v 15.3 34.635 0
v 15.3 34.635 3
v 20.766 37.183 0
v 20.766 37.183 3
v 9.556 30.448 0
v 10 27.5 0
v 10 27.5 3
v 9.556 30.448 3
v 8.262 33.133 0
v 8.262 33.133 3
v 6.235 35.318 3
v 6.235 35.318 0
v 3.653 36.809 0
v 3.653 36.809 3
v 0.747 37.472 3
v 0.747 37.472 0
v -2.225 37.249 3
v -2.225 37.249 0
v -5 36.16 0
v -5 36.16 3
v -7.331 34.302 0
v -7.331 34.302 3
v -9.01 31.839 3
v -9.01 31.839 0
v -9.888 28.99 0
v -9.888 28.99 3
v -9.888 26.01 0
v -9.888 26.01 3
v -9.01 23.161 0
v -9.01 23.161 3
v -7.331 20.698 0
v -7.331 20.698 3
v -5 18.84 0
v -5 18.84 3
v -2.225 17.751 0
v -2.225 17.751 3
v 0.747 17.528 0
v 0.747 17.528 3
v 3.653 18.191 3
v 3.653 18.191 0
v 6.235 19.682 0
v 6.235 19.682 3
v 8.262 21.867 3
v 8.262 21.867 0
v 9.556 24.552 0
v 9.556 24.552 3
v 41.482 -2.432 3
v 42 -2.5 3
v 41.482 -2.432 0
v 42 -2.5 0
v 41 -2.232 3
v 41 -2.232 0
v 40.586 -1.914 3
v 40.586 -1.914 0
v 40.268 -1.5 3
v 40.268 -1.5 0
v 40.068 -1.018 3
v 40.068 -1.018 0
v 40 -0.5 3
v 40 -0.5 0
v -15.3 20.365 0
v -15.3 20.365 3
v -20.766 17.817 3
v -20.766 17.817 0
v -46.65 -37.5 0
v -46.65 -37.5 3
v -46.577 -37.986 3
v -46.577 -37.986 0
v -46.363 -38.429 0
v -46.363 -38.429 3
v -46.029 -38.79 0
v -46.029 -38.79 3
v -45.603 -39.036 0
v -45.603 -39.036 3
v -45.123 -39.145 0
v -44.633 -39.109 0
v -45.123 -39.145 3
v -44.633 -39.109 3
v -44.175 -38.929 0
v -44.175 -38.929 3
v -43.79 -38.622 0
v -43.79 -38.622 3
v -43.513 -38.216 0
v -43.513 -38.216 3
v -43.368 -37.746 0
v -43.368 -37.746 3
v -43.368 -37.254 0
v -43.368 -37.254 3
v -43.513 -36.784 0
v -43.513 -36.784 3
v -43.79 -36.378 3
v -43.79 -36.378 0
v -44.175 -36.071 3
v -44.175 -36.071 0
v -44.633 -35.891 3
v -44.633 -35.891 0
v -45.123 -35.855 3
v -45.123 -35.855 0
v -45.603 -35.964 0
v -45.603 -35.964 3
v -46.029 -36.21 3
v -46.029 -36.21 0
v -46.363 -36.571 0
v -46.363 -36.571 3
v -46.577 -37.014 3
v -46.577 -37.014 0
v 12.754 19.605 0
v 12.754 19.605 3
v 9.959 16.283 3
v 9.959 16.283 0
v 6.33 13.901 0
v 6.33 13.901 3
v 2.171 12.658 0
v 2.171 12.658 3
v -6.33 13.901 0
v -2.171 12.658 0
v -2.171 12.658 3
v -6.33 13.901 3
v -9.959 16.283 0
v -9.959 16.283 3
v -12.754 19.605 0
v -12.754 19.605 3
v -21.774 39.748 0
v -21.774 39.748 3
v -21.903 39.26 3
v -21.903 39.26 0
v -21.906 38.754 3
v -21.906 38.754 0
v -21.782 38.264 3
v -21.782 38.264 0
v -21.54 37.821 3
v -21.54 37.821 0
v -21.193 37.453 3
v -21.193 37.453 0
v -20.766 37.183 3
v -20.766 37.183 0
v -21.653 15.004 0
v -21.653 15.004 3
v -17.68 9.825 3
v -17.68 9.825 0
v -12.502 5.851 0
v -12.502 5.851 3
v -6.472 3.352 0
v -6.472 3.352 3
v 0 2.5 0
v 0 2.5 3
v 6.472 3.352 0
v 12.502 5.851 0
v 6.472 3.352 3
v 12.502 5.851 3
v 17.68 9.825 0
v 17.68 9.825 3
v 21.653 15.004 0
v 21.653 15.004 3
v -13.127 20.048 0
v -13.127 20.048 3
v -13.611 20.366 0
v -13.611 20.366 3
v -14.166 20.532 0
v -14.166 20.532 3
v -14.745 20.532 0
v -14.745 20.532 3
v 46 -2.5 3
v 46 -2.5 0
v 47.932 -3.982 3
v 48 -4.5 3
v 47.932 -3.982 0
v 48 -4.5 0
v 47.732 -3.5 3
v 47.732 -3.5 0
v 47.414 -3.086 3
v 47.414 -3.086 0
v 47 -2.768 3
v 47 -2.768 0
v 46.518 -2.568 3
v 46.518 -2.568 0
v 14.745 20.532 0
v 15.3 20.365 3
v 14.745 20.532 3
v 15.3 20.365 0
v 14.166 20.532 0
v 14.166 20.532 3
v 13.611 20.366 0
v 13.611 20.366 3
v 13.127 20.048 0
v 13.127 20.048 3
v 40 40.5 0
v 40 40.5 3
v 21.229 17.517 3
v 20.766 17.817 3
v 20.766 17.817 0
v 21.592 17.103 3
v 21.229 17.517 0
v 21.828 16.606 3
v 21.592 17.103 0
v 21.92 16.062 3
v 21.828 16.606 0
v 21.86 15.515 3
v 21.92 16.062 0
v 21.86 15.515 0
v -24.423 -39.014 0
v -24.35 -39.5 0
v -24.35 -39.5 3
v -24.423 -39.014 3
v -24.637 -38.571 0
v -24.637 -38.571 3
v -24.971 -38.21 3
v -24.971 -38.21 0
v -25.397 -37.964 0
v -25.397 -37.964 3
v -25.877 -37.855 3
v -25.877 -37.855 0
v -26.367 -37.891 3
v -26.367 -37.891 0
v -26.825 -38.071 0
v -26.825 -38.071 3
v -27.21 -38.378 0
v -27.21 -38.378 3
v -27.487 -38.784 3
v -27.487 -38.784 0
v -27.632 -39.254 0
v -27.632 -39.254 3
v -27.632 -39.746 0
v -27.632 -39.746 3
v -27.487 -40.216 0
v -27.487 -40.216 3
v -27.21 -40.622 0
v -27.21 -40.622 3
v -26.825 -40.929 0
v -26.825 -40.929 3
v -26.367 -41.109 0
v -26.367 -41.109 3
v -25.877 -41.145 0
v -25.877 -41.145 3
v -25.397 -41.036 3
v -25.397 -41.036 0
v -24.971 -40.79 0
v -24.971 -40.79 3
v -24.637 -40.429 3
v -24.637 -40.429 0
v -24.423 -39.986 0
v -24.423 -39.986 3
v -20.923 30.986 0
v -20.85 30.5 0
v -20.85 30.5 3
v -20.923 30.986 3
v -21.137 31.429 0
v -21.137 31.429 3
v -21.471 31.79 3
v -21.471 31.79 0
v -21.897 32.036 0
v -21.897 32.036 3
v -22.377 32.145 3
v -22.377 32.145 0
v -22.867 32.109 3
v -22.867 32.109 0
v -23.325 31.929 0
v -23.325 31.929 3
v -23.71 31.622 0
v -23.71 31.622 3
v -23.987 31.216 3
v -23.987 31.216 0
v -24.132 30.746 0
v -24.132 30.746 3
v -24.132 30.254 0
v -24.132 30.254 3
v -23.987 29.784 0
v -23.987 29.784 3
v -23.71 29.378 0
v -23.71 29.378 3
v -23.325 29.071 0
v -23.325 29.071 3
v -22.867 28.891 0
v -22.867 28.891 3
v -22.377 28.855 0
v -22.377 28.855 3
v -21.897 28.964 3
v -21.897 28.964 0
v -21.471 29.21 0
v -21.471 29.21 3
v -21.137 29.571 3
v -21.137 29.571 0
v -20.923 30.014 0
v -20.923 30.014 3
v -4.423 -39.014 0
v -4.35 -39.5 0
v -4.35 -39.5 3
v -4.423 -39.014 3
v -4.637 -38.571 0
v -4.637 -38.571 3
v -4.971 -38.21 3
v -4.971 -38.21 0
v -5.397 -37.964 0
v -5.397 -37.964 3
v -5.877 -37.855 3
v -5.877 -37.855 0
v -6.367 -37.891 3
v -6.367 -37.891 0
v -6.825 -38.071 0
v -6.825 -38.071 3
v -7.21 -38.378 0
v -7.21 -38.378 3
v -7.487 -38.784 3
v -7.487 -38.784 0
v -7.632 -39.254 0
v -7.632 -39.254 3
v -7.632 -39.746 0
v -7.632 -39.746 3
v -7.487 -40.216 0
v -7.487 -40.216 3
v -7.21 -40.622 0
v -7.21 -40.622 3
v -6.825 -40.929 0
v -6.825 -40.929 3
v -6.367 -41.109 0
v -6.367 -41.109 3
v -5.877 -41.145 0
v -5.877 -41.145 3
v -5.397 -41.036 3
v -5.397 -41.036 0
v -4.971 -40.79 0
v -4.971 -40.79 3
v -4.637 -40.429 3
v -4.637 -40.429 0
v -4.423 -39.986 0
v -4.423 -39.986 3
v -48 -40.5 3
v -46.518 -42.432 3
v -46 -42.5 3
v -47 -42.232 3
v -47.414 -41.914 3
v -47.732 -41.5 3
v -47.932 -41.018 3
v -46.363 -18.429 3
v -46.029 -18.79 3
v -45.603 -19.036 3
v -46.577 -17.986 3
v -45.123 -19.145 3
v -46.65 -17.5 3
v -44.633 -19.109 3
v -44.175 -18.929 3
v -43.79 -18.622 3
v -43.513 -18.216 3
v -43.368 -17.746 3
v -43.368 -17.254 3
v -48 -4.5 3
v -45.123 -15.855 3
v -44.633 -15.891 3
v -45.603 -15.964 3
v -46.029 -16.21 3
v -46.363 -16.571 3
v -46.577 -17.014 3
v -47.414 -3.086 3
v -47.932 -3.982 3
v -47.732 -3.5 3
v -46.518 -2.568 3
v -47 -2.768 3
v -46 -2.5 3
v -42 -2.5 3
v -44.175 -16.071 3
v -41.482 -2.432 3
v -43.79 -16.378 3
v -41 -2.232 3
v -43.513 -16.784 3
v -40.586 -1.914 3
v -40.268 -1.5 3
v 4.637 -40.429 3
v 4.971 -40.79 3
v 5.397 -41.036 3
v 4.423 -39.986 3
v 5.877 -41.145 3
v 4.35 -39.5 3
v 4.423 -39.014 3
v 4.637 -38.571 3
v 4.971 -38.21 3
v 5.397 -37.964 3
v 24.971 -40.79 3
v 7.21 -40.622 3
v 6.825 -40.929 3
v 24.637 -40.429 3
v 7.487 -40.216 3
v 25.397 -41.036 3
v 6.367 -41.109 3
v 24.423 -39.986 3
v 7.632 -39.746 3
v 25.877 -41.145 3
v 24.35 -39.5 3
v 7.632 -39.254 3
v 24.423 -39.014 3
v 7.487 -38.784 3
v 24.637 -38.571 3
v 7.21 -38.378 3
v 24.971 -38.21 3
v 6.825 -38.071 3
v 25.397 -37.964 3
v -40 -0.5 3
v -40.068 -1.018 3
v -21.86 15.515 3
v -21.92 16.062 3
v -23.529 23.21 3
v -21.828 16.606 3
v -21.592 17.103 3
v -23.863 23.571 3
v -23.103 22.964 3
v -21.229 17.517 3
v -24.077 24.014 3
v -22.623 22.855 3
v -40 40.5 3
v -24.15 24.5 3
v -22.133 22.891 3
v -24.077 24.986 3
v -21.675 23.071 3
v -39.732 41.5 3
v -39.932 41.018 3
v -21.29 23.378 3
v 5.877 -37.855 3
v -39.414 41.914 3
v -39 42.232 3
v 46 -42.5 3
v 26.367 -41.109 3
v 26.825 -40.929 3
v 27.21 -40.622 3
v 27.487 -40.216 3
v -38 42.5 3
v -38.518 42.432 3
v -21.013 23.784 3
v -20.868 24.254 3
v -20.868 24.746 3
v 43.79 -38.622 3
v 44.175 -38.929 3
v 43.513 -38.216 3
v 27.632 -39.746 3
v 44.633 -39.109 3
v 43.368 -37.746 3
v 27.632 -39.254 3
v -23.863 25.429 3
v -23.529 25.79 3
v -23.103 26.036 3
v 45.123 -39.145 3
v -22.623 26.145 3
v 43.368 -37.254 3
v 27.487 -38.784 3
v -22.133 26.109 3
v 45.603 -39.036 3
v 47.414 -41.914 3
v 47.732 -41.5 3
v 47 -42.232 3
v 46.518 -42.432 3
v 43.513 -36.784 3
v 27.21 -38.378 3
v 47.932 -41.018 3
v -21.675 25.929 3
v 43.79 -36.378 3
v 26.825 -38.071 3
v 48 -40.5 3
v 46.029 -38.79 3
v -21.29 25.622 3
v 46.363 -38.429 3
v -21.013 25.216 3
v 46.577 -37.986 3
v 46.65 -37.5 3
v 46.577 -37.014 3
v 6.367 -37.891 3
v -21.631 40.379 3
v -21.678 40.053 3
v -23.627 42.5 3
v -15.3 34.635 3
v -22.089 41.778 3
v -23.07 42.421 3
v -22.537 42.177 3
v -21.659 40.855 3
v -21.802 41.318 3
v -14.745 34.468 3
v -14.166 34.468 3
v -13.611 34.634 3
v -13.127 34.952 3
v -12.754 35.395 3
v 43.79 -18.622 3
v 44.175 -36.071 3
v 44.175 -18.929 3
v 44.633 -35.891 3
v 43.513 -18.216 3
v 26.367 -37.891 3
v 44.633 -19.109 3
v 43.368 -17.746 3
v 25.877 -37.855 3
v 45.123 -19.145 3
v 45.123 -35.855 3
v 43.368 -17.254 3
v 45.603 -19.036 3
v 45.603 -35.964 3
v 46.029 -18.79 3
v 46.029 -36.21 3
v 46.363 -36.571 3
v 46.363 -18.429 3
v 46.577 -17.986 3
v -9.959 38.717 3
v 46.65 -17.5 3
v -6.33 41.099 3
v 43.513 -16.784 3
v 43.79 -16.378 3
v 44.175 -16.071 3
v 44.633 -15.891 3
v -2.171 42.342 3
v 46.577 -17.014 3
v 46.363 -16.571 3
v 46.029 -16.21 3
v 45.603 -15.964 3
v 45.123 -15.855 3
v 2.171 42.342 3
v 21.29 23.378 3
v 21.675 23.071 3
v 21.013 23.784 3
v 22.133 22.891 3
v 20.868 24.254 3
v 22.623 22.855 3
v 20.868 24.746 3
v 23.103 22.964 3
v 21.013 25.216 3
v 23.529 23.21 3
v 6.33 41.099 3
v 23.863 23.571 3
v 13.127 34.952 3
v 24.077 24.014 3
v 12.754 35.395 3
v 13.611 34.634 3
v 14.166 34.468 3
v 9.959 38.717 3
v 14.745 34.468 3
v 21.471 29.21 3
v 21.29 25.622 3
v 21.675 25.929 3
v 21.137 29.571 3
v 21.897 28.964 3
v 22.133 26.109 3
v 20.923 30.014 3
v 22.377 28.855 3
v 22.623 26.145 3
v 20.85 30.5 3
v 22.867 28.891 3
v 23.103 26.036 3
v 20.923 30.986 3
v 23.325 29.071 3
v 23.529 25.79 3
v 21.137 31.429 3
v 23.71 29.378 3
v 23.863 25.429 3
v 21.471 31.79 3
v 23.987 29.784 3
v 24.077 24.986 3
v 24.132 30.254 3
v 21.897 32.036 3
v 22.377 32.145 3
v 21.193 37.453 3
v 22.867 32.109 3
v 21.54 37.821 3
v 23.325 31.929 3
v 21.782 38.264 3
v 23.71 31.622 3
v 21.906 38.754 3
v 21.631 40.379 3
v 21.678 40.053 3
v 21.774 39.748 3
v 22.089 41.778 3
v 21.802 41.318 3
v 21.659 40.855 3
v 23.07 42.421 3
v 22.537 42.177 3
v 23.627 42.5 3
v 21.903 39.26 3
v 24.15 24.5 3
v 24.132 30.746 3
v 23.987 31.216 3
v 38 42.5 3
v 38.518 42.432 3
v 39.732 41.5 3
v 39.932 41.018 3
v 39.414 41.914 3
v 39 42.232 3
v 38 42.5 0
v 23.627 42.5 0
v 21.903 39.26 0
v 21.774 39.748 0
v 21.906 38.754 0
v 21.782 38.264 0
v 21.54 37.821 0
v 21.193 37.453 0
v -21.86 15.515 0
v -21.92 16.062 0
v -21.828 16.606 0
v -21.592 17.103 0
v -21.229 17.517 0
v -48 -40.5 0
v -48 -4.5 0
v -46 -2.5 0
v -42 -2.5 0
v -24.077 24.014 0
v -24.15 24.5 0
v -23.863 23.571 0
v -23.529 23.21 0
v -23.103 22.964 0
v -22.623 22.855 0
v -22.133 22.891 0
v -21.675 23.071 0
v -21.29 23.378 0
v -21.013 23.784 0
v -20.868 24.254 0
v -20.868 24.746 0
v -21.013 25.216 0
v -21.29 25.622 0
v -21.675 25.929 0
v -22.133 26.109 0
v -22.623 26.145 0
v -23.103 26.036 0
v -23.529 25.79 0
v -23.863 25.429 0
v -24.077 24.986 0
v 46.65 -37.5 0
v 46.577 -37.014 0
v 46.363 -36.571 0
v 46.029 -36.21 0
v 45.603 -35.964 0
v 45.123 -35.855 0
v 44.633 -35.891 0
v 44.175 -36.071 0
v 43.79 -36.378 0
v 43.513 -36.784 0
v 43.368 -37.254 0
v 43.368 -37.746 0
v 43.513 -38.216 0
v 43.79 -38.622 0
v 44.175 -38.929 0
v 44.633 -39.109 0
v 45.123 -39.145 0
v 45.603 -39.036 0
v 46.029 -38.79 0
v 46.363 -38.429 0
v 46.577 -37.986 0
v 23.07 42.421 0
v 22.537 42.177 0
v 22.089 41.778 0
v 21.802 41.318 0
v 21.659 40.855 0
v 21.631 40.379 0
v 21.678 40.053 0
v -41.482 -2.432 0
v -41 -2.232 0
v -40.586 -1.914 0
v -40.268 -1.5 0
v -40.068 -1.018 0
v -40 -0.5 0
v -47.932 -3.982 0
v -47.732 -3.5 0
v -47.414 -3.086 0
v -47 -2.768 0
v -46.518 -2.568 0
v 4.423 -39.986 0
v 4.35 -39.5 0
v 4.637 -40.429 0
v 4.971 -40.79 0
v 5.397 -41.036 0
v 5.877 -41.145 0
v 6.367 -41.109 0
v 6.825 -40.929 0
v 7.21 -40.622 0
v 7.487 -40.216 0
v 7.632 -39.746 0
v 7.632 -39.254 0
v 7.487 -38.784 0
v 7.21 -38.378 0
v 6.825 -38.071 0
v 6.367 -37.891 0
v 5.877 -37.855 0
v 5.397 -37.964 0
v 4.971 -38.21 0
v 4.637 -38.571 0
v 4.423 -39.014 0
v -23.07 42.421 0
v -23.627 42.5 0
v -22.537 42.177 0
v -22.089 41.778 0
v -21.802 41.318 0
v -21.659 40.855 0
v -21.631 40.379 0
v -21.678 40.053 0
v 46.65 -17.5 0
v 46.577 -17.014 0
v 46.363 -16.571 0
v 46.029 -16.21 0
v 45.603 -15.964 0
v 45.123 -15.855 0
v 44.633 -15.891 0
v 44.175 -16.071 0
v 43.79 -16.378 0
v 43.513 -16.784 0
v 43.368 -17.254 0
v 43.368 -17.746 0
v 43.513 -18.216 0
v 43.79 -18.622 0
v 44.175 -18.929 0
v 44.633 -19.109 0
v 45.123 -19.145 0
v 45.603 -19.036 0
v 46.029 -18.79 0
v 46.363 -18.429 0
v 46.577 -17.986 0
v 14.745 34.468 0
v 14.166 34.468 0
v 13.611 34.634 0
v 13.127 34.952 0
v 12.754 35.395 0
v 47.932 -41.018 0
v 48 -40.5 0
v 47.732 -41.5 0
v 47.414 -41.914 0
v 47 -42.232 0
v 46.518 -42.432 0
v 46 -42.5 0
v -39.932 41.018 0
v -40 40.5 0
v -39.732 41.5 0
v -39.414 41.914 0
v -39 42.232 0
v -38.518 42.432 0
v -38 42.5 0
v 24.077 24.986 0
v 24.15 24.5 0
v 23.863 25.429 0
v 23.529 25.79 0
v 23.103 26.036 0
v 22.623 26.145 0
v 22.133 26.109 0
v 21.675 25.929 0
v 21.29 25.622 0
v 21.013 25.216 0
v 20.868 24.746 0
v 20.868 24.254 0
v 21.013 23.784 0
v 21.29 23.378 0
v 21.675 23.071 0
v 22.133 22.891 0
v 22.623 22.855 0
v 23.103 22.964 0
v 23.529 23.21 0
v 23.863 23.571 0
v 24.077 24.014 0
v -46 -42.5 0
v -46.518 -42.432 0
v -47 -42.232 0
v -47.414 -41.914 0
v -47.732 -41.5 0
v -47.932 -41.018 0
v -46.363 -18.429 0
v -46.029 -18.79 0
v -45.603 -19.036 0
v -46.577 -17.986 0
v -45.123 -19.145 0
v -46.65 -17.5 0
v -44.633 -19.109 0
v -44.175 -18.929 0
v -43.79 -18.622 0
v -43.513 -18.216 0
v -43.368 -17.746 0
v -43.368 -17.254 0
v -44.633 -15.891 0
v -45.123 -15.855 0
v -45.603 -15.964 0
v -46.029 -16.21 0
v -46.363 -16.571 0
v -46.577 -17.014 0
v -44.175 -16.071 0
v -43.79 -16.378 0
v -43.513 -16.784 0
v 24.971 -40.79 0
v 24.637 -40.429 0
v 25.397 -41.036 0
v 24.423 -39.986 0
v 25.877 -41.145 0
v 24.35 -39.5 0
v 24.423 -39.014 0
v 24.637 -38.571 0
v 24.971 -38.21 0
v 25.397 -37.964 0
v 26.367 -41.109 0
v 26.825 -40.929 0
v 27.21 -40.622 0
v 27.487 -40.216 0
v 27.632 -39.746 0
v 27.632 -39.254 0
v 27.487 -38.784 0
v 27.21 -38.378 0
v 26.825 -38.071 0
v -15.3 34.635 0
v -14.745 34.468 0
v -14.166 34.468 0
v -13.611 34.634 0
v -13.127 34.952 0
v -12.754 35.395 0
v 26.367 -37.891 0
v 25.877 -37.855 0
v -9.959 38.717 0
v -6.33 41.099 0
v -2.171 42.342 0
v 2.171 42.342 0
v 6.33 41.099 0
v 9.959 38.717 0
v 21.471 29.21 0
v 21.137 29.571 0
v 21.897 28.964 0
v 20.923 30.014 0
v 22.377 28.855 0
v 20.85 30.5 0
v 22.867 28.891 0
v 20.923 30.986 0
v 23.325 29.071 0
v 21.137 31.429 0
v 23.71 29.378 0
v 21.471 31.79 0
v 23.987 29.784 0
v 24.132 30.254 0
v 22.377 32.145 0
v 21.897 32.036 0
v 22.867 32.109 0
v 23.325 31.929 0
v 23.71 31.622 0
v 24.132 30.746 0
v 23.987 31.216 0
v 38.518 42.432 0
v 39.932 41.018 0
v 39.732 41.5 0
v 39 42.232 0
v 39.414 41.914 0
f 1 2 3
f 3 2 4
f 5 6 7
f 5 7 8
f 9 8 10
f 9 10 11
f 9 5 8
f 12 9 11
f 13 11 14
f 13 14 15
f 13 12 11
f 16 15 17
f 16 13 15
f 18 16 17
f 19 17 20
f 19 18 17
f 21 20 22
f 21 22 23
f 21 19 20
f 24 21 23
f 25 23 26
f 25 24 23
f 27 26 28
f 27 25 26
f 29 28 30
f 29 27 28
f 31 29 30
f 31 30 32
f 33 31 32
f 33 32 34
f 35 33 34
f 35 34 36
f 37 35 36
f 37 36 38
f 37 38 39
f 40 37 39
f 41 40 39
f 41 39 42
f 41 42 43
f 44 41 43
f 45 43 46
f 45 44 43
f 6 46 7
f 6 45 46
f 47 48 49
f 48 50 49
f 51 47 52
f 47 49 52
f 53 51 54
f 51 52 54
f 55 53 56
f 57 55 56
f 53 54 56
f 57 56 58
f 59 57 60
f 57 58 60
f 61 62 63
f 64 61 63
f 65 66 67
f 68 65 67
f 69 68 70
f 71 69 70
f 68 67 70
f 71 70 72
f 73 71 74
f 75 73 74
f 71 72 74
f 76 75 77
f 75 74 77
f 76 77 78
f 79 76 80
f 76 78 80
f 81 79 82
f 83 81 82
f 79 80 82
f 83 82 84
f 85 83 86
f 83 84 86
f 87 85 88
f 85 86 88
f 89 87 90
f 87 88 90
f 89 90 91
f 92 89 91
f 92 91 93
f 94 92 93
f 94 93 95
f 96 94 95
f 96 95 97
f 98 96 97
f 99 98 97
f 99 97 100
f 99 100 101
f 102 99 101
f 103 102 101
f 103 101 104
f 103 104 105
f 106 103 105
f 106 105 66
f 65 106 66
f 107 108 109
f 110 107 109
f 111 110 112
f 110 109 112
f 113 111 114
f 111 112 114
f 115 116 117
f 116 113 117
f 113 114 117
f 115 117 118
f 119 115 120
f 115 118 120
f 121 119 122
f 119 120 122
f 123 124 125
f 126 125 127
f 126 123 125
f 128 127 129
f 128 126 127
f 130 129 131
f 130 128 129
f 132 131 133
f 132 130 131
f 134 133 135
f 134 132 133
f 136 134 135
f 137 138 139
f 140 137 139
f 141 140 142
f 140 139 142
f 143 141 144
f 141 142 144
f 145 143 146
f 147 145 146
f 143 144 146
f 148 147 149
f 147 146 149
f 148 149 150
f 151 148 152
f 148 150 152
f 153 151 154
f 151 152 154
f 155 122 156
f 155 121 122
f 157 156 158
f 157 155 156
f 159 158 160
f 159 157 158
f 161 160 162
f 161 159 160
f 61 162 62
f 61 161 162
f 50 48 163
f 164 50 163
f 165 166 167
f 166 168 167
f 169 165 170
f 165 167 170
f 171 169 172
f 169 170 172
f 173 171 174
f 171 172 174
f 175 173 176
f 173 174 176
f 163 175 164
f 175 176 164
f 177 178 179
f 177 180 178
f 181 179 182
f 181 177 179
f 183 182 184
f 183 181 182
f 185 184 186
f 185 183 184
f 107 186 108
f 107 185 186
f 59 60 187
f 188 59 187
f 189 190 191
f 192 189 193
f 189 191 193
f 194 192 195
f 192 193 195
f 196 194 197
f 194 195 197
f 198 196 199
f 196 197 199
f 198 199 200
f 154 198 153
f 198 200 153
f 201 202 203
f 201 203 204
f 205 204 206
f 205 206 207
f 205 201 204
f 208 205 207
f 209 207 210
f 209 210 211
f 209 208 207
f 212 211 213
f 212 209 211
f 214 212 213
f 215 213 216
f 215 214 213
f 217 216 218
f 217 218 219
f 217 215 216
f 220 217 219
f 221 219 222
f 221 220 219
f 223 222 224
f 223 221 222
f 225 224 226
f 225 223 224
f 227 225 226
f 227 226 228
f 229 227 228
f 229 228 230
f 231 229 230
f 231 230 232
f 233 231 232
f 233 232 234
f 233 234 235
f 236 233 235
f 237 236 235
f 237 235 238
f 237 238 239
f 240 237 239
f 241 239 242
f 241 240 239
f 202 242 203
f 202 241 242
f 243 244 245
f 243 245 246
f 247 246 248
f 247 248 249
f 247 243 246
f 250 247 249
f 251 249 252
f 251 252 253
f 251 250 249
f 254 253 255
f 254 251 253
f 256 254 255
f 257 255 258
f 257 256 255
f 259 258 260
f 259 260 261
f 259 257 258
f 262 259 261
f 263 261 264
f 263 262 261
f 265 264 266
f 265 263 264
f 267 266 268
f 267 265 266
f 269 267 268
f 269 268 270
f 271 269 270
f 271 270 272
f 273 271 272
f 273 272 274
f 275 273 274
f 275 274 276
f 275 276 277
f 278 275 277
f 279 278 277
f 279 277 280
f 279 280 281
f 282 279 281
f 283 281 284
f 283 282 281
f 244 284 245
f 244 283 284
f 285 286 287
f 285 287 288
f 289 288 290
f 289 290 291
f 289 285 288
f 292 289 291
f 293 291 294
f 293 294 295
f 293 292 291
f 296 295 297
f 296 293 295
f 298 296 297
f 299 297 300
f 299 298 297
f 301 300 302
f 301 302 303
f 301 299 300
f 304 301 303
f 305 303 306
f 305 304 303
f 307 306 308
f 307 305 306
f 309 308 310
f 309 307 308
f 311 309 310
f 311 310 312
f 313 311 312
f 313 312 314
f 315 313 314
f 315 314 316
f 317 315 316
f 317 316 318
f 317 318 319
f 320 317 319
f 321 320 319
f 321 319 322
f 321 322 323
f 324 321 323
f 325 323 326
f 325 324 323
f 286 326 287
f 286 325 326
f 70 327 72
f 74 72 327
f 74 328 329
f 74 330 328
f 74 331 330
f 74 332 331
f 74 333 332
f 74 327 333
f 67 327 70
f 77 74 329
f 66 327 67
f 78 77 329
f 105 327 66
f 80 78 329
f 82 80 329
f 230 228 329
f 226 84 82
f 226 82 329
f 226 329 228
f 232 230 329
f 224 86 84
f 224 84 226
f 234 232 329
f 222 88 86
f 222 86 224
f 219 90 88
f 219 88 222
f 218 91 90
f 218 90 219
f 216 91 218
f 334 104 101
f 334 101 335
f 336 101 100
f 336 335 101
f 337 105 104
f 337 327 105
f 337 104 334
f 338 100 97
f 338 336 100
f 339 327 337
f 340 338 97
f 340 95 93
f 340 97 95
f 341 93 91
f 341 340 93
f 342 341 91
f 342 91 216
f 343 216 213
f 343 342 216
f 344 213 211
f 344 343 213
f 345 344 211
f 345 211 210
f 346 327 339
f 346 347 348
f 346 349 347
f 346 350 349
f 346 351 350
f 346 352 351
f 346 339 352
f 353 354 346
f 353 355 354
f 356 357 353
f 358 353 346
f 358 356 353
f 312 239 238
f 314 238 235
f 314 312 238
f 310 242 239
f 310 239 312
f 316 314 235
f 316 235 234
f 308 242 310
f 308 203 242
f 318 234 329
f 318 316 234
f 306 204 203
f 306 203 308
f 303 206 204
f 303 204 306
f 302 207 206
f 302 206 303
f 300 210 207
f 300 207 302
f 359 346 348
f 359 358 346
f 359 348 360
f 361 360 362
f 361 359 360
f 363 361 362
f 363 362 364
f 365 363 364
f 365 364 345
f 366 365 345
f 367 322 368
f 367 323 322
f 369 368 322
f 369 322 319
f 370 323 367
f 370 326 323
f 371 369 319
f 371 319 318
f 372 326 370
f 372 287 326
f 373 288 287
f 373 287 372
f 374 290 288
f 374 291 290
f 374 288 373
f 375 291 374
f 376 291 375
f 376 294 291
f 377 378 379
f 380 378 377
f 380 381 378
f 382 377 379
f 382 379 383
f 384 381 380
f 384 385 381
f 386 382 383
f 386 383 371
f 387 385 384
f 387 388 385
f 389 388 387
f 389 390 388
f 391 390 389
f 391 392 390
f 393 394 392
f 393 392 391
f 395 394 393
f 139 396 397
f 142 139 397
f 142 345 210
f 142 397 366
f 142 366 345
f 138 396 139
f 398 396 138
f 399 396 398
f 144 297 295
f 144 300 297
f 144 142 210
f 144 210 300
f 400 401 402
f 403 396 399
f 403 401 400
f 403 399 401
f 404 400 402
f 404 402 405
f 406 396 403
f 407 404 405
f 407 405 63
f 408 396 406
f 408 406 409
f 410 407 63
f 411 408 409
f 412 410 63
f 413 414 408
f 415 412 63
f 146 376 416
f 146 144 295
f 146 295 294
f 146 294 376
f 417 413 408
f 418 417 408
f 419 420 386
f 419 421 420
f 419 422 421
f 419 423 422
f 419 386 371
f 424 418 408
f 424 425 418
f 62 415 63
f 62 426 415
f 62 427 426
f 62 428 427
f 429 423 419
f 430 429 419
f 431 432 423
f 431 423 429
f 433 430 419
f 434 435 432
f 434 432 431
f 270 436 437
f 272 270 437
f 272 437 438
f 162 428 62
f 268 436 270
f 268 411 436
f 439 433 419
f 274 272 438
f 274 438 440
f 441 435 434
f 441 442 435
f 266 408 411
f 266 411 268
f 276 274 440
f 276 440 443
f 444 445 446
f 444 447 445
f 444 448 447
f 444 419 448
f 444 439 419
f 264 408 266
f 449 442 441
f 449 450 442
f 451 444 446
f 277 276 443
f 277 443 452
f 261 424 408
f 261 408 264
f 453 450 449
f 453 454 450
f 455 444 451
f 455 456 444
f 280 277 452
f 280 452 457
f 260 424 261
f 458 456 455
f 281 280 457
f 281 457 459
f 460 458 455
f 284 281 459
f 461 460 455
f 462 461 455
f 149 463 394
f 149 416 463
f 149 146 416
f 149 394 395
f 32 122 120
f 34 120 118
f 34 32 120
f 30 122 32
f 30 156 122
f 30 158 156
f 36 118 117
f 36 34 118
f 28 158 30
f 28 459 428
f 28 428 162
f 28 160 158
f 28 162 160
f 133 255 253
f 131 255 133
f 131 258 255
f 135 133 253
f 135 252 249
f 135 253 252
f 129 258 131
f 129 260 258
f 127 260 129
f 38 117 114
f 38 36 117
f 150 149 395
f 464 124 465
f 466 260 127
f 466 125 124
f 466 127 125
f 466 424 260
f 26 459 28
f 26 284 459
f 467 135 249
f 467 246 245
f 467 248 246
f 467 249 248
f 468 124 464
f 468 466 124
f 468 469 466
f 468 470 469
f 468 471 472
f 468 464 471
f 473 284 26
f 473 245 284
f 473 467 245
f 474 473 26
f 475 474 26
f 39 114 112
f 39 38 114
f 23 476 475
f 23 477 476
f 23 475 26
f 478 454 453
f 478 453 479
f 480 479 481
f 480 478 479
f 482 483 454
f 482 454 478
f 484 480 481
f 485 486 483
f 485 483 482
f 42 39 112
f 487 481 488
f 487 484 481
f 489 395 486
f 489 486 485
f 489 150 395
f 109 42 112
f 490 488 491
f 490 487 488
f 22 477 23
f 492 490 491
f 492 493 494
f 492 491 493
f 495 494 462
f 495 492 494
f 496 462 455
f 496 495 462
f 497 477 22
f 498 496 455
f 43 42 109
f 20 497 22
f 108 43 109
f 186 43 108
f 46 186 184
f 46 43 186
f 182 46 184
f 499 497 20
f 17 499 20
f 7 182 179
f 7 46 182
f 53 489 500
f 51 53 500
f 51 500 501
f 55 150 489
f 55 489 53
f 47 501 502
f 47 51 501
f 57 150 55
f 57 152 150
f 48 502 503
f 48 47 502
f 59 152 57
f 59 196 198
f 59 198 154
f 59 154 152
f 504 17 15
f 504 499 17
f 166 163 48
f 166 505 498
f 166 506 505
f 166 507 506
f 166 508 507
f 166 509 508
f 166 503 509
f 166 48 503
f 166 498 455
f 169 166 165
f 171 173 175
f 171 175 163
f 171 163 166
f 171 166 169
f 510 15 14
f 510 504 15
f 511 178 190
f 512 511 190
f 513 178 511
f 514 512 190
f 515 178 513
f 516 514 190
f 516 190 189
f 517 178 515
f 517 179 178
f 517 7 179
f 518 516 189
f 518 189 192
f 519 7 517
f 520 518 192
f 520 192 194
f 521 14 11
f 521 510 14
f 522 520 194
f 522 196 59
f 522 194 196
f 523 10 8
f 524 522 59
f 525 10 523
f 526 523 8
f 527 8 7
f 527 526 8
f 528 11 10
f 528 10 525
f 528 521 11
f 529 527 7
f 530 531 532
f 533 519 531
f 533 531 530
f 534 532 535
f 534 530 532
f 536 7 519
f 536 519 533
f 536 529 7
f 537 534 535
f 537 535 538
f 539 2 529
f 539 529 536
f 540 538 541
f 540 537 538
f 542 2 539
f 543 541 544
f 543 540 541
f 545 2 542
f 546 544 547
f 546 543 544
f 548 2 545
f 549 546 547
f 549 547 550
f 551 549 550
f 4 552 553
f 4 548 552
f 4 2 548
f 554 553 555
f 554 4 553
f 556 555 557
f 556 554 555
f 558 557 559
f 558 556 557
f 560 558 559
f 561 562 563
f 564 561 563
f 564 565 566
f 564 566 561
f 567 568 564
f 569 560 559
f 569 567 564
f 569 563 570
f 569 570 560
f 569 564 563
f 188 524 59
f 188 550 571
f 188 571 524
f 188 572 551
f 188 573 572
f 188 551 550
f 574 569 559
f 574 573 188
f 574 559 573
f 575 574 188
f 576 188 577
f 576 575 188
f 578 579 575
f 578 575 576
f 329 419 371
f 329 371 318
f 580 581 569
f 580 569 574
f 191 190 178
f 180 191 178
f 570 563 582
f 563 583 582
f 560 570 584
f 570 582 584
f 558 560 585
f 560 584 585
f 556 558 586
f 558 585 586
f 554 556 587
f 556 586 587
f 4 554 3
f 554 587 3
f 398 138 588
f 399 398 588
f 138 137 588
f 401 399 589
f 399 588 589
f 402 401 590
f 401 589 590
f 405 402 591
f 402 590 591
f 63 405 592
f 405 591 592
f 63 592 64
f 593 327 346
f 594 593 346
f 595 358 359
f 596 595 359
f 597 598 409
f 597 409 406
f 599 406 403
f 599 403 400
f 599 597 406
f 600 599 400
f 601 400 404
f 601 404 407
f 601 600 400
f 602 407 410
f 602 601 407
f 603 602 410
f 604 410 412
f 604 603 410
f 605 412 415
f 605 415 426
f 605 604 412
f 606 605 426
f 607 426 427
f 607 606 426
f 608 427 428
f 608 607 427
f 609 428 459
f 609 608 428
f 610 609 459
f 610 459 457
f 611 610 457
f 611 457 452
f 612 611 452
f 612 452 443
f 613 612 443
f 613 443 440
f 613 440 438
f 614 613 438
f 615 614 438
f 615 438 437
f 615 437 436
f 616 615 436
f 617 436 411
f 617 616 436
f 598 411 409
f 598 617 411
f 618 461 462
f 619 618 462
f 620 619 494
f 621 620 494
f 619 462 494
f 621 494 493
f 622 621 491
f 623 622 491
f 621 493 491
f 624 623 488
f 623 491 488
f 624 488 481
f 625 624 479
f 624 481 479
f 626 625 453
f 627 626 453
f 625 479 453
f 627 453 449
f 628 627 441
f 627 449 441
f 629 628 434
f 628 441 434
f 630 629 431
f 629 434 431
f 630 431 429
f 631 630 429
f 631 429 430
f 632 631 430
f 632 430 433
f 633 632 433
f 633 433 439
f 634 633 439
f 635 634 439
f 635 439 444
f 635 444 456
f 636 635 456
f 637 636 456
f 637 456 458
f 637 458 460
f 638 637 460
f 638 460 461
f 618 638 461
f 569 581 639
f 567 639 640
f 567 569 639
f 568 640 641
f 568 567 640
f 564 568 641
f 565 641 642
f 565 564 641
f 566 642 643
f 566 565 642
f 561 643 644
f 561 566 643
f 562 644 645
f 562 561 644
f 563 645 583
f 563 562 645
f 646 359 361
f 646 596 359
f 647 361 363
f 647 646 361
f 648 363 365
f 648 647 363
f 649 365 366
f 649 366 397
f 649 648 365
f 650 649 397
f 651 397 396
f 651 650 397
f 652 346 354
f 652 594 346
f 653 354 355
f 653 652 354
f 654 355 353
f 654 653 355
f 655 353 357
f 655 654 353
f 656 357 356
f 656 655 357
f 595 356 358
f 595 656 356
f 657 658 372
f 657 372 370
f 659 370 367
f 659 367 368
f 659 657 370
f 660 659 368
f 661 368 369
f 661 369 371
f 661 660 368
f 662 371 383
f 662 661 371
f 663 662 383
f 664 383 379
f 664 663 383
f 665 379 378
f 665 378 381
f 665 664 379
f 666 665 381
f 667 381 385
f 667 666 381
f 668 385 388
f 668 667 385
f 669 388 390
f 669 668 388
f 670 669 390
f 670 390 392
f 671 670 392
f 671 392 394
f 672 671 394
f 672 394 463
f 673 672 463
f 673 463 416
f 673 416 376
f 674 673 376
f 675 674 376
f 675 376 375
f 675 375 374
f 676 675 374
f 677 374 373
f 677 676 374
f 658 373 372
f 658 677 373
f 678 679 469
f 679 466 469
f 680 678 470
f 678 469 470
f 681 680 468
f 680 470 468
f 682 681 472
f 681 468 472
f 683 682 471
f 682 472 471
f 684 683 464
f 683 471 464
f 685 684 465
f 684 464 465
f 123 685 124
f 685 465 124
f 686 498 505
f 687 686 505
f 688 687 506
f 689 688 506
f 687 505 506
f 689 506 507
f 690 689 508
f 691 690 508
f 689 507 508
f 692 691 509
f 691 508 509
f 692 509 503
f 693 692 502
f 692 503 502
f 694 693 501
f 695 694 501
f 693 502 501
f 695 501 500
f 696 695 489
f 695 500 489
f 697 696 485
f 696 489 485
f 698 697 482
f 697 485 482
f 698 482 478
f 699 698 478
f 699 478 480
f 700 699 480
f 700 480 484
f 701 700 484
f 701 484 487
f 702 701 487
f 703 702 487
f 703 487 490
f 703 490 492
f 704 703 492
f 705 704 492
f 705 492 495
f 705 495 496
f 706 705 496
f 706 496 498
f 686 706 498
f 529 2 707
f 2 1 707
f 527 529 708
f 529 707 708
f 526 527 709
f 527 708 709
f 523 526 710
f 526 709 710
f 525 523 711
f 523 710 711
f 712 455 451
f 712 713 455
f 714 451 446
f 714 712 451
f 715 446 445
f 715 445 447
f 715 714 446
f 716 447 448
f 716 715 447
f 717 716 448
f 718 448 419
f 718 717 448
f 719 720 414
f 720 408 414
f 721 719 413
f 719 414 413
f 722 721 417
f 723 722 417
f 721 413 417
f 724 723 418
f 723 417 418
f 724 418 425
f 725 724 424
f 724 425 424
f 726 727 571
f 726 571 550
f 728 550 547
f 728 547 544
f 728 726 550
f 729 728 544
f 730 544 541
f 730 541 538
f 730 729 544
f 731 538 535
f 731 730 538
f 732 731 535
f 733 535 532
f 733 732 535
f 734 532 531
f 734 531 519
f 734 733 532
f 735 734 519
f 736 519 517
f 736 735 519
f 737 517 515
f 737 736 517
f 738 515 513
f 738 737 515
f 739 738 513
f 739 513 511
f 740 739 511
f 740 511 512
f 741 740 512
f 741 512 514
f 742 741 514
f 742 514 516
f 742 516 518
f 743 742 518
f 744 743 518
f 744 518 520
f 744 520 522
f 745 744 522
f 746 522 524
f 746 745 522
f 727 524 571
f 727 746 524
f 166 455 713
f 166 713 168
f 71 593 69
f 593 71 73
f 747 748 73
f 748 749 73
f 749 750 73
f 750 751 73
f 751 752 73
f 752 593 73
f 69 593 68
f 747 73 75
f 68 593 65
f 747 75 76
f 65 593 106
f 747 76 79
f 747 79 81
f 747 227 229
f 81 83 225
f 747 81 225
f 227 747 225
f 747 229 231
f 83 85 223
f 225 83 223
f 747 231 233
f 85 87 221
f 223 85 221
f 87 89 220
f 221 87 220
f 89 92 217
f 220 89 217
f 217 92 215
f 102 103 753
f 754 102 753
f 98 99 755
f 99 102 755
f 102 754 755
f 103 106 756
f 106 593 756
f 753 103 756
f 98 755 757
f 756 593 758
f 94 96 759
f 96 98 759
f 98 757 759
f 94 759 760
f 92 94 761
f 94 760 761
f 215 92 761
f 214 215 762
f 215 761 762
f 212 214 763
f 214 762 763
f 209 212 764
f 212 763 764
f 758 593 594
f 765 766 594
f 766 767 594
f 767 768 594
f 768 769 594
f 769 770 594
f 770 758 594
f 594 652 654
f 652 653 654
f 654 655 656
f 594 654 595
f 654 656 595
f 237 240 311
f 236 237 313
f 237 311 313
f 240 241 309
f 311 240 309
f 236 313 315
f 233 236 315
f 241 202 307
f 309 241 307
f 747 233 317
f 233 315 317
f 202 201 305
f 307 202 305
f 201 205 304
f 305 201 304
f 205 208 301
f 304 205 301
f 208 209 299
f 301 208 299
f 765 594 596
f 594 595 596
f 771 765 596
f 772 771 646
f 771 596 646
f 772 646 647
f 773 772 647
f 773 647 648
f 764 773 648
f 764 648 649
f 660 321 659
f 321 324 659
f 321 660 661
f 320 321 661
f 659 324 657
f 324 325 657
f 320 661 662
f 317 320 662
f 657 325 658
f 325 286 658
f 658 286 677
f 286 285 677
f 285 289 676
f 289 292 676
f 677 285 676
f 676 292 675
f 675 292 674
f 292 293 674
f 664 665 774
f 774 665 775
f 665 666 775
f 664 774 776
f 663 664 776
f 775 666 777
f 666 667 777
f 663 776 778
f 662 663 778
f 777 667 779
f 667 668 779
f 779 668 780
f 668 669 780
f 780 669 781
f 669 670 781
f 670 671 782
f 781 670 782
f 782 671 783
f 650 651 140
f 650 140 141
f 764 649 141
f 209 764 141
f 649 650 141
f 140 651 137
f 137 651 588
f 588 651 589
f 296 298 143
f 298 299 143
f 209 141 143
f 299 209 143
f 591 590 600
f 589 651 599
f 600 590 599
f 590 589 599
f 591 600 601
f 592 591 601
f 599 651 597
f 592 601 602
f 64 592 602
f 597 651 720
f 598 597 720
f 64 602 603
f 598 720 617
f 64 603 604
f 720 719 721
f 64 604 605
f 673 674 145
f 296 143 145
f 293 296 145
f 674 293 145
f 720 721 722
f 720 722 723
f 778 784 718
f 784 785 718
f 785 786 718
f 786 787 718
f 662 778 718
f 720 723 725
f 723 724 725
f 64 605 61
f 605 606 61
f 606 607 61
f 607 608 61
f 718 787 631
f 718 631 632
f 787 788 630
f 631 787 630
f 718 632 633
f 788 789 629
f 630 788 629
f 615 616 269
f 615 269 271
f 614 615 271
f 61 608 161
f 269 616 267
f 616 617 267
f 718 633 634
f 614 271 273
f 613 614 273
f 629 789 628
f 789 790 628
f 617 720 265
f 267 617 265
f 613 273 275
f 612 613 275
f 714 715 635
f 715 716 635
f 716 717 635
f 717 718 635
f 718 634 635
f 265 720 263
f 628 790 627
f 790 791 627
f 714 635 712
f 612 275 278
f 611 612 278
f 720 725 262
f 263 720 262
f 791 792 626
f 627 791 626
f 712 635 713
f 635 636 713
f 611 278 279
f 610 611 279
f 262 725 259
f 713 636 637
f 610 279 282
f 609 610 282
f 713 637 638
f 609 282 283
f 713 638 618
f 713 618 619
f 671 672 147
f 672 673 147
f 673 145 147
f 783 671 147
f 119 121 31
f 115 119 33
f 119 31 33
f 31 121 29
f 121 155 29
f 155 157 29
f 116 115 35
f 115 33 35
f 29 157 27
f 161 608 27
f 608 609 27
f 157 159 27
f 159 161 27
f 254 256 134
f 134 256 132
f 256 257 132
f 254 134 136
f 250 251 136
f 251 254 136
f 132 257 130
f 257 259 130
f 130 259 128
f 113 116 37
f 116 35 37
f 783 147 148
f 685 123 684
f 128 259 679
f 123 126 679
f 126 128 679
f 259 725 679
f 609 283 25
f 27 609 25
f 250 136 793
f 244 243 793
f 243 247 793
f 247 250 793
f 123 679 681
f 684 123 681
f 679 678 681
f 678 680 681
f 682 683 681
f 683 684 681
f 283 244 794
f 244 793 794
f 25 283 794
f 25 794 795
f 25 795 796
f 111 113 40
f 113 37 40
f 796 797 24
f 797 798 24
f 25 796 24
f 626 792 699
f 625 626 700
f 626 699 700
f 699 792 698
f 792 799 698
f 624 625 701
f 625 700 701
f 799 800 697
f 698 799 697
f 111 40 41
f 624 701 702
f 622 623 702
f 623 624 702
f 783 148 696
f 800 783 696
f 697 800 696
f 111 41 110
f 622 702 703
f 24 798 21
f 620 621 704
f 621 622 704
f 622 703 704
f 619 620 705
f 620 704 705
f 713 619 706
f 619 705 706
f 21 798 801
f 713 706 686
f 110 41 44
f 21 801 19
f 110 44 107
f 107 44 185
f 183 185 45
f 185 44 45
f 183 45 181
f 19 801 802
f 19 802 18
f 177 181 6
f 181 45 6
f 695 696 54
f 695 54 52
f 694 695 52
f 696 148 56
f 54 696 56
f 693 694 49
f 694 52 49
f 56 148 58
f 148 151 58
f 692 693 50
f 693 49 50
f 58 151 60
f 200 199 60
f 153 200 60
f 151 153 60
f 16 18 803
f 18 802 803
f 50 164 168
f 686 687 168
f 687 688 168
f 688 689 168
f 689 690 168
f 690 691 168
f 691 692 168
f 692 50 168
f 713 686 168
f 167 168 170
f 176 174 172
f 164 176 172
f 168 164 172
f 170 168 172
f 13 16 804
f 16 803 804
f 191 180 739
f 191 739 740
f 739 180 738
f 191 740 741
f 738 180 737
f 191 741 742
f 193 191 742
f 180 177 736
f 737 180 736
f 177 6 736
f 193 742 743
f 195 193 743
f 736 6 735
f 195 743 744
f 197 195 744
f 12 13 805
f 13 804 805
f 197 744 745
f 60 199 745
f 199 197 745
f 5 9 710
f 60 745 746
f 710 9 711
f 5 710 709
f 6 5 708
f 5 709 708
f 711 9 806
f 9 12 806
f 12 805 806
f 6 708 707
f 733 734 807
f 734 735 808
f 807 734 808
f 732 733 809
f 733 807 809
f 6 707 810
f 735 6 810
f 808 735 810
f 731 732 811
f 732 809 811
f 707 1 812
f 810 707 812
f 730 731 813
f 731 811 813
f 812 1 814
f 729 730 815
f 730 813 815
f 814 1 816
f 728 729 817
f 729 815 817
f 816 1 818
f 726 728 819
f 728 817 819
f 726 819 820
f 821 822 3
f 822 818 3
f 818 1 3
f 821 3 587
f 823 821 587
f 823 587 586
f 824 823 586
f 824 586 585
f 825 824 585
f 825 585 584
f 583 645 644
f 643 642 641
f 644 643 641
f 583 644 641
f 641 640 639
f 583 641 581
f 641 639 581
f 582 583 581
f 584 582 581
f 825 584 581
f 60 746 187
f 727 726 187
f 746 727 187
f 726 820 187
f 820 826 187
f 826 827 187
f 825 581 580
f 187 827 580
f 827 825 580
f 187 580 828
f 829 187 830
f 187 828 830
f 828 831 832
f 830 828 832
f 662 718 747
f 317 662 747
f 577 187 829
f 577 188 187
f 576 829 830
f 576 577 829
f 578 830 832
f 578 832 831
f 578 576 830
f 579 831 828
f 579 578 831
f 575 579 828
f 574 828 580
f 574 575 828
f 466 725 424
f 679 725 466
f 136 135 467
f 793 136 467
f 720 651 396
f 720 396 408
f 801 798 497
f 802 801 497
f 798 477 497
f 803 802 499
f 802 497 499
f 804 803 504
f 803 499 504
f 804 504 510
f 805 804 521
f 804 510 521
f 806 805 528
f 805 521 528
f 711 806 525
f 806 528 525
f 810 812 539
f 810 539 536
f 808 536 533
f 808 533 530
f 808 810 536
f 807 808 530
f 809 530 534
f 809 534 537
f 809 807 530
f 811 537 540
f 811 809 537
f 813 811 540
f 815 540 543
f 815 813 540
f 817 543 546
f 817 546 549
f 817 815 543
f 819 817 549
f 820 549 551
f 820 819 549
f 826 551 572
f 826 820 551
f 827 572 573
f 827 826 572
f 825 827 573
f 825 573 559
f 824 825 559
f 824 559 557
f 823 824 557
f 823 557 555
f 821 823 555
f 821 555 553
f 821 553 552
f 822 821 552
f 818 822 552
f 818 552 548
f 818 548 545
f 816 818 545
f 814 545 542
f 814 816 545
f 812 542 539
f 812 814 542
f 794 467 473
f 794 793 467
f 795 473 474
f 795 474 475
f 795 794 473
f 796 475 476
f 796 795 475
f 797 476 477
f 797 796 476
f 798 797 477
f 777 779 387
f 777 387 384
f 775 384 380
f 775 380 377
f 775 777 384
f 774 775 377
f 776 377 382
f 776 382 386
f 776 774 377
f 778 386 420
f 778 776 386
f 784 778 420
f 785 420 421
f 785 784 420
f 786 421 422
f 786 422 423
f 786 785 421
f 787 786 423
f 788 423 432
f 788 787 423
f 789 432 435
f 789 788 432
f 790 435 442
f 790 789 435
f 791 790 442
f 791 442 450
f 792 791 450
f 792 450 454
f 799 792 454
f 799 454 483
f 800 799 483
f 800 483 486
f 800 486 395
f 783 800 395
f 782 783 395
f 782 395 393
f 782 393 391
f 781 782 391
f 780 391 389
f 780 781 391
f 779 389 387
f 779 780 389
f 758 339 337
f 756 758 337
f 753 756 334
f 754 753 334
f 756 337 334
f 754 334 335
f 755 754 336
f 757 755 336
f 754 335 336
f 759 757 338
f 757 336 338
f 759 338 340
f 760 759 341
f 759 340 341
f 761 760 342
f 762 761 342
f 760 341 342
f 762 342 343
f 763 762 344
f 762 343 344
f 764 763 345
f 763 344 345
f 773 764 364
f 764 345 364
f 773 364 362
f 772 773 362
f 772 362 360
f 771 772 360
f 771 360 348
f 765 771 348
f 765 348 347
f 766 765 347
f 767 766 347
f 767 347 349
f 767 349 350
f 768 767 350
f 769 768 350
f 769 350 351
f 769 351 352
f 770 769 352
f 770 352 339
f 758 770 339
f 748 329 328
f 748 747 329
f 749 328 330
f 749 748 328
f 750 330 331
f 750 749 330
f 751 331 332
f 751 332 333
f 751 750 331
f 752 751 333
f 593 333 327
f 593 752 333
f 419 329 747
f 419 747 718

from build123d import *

# Parameters (mm, degrees)
SKETCH_1_W          = 80
SKETCH_1_H          = 85
SKETCH_1_R          = 10
SKETCH_1_R_2        = 1.65
EXTRUDE_1_DEPTH     = 3
CUT_EXTRUDE_1_DEPTH = 59.440140315
SKETCH_3_W          = 8
SKETCH_3_H          = 40
EXTRUDE_2_DEPTH     = 3
SKETCH_4_R          = 1.65
CUT_EXTRUDE_2_DEPTH = 65.181383594
FILLET_1_R          = 2
FILLET_2_R          = 2


with BuildPart() as part:
    # 草图1 → 凸台-拉伸1 (new body)
    with BuildSketch(Plane.XY):
        Rectangle(SKETCH_1_W, SKETCH_1_H)
        with Locations((0, 27.5)):
            Circle(SKETCH_1_R, mode=Mode.SUBTRACT)
        with Locations((-6, -39.5)):
            Circle(SKETCH_1_R_2, mode=Mode.SUBTRACT)
        with Locations((-26, -39.5)):
            Circle(SKETCH_1_R_2, mode=Mode.SUBTRACT)
        with Locations(Location((26, -39.5, 0), (0, 0, 180))):
            Circle(SKETCH_1_R_2, mode=Mode.SUBTRACT)
        with Locations(Location((6, -39.5, 0), (0, 0, 180))):
            Circle(SKETCH_1_R_2, mode=Mode.SUBTRACT)
        with Locations((-22.5, 30.5)):
            Circle(SKETCH_1_R_2, mode=Mode.SUBTRACT)
        with Locations(Location((-22.5, 24.5, 0), (0, 0, 180))):
            Circle(SKETCH_1_R_2, mode=Mode.SUBTRACT)
        with Locations(Location((22.5, 30.5, 0), (0, 0, 180))):
            Circle(SKETCH_1_R_2, mode=Mode.SUBTRACT)
        with Locations((22.5, 24.5)):
            Circle(SKETCH_1_R_2, mode=Mode.SUBTRACT)
    extrude(amount=EXTRUDE_1_DEPTH)

    # 草图2 → 切除-拉伸1 (cut, through all)
    with BuildSketch(Plane.XY.offset(3)):
        with BuildLine():
            Line((22.657694676, 16.934543456), (13.594616806, 21.160726074))
            ThreePointArc((13.594616806, 21.160726074), (0, 12.5), (-13.594616806, 21.160726074))
            Line((-13.594616806, 21.160726074), (-22.657694676, 16.934543456))
            ThreePointArc((-22.657694676, 16.934543456), (0, 2.5), (22.657694676, 16.934543456))
        make_face()
        with BuildLine():
            Line((-22.657694676, 38.065456544), (-13.594616806, 33.839273926))
            ThreePointArc((-13.594616806, 33.839273926), (0, 42.5), (13.594616806, 33.839273926))
            Line((13.594616806, 33.839273926), (22.657694676, 38.065456544))
            ThreePointArc((22.657694676, 38.065456544), (0, 52.5), (-22.657694676, 38.065456544))
        make_face()
    extrude(amount=-CUT_EXTRUDE_1_DEPTH, mode=Mode.SUBTRACT)

    # 草图3 → 凸台-拉伸2 (add)
    with BuildSketch(Plane.XY.offset(3)):
        with Locations((44, -22.5)):
            Rectangle(SKETCH_3_W, SKETCH_3_H)
        with Locations((-44, -22.5)):
            Rectangle(SKETCH_3_W, SKETCH_3_H)
    extrude(amount=-EXTRUDE_2_DEPTH)

    # 草图4 → 切除-拉伸2 (cut, through all)
    with BuildSketch(Plane.XY.offset(3)):
        with Locations((45, -37.5)):
            Circle(SKETCH_4_R)
        with Locations((45, -17.5)):
            Circle(SKETCH_4_R)
        with Locations(Location((-45, -17.5, 0), (0, 0, 180))):
            Circle(SKETCH_4_R)
        with Locations(Location((-45, -37.5, 0), (0, 0, 180))):
            Circle(SKETCH_4_R)
    extrude(amount=-CUT_EXTRUDE_2_DEPTH, mode=Mode.SUBTRACT)

    # 圆角1
    fillet_1_edges = [part.edges().sort_by_distance(p)[0] for p in [
        (-48, -2.5, 1.5),
        (-13.594616806, 21.160726074, 1.5),
        (13.594616806, 21.160726074, 1.5),
        (22.657694676, 16.934543456, 1.5),
        (-22.657694676, 16.934543456, 1.5),
        (-22.657694676, 38.065456544, 1.5),
        (13.594616806, 33.839273926, 1.5),
        (22.657694676, 38.065456544, 1.5),
        (-13.594616806, 33.839273926, 1.5),
        (-40, 42.5, 1.5),
        (40, -2.5, 1.5),
        (48, -2.5, 1.5),
    ]]
    fillet(fillet_1_edges, radius=FILLET_1_R)

    # 圆角2
    fillet_2_edges = [part.edges().sort_by_distance(p)[0] for p in [
        (20, 42.5, 1.5),
        (-20, 42.5, 1.5),
        (40, 42.5, 1.5),
        (-48, -42.5, 1.5),
        (48, -42.5, 1.5),
        (-40, -2.5, 1.5),
    ]]
    fillet(fillet_2_edges, radius=FILLET_2_R)


solid = part.part
